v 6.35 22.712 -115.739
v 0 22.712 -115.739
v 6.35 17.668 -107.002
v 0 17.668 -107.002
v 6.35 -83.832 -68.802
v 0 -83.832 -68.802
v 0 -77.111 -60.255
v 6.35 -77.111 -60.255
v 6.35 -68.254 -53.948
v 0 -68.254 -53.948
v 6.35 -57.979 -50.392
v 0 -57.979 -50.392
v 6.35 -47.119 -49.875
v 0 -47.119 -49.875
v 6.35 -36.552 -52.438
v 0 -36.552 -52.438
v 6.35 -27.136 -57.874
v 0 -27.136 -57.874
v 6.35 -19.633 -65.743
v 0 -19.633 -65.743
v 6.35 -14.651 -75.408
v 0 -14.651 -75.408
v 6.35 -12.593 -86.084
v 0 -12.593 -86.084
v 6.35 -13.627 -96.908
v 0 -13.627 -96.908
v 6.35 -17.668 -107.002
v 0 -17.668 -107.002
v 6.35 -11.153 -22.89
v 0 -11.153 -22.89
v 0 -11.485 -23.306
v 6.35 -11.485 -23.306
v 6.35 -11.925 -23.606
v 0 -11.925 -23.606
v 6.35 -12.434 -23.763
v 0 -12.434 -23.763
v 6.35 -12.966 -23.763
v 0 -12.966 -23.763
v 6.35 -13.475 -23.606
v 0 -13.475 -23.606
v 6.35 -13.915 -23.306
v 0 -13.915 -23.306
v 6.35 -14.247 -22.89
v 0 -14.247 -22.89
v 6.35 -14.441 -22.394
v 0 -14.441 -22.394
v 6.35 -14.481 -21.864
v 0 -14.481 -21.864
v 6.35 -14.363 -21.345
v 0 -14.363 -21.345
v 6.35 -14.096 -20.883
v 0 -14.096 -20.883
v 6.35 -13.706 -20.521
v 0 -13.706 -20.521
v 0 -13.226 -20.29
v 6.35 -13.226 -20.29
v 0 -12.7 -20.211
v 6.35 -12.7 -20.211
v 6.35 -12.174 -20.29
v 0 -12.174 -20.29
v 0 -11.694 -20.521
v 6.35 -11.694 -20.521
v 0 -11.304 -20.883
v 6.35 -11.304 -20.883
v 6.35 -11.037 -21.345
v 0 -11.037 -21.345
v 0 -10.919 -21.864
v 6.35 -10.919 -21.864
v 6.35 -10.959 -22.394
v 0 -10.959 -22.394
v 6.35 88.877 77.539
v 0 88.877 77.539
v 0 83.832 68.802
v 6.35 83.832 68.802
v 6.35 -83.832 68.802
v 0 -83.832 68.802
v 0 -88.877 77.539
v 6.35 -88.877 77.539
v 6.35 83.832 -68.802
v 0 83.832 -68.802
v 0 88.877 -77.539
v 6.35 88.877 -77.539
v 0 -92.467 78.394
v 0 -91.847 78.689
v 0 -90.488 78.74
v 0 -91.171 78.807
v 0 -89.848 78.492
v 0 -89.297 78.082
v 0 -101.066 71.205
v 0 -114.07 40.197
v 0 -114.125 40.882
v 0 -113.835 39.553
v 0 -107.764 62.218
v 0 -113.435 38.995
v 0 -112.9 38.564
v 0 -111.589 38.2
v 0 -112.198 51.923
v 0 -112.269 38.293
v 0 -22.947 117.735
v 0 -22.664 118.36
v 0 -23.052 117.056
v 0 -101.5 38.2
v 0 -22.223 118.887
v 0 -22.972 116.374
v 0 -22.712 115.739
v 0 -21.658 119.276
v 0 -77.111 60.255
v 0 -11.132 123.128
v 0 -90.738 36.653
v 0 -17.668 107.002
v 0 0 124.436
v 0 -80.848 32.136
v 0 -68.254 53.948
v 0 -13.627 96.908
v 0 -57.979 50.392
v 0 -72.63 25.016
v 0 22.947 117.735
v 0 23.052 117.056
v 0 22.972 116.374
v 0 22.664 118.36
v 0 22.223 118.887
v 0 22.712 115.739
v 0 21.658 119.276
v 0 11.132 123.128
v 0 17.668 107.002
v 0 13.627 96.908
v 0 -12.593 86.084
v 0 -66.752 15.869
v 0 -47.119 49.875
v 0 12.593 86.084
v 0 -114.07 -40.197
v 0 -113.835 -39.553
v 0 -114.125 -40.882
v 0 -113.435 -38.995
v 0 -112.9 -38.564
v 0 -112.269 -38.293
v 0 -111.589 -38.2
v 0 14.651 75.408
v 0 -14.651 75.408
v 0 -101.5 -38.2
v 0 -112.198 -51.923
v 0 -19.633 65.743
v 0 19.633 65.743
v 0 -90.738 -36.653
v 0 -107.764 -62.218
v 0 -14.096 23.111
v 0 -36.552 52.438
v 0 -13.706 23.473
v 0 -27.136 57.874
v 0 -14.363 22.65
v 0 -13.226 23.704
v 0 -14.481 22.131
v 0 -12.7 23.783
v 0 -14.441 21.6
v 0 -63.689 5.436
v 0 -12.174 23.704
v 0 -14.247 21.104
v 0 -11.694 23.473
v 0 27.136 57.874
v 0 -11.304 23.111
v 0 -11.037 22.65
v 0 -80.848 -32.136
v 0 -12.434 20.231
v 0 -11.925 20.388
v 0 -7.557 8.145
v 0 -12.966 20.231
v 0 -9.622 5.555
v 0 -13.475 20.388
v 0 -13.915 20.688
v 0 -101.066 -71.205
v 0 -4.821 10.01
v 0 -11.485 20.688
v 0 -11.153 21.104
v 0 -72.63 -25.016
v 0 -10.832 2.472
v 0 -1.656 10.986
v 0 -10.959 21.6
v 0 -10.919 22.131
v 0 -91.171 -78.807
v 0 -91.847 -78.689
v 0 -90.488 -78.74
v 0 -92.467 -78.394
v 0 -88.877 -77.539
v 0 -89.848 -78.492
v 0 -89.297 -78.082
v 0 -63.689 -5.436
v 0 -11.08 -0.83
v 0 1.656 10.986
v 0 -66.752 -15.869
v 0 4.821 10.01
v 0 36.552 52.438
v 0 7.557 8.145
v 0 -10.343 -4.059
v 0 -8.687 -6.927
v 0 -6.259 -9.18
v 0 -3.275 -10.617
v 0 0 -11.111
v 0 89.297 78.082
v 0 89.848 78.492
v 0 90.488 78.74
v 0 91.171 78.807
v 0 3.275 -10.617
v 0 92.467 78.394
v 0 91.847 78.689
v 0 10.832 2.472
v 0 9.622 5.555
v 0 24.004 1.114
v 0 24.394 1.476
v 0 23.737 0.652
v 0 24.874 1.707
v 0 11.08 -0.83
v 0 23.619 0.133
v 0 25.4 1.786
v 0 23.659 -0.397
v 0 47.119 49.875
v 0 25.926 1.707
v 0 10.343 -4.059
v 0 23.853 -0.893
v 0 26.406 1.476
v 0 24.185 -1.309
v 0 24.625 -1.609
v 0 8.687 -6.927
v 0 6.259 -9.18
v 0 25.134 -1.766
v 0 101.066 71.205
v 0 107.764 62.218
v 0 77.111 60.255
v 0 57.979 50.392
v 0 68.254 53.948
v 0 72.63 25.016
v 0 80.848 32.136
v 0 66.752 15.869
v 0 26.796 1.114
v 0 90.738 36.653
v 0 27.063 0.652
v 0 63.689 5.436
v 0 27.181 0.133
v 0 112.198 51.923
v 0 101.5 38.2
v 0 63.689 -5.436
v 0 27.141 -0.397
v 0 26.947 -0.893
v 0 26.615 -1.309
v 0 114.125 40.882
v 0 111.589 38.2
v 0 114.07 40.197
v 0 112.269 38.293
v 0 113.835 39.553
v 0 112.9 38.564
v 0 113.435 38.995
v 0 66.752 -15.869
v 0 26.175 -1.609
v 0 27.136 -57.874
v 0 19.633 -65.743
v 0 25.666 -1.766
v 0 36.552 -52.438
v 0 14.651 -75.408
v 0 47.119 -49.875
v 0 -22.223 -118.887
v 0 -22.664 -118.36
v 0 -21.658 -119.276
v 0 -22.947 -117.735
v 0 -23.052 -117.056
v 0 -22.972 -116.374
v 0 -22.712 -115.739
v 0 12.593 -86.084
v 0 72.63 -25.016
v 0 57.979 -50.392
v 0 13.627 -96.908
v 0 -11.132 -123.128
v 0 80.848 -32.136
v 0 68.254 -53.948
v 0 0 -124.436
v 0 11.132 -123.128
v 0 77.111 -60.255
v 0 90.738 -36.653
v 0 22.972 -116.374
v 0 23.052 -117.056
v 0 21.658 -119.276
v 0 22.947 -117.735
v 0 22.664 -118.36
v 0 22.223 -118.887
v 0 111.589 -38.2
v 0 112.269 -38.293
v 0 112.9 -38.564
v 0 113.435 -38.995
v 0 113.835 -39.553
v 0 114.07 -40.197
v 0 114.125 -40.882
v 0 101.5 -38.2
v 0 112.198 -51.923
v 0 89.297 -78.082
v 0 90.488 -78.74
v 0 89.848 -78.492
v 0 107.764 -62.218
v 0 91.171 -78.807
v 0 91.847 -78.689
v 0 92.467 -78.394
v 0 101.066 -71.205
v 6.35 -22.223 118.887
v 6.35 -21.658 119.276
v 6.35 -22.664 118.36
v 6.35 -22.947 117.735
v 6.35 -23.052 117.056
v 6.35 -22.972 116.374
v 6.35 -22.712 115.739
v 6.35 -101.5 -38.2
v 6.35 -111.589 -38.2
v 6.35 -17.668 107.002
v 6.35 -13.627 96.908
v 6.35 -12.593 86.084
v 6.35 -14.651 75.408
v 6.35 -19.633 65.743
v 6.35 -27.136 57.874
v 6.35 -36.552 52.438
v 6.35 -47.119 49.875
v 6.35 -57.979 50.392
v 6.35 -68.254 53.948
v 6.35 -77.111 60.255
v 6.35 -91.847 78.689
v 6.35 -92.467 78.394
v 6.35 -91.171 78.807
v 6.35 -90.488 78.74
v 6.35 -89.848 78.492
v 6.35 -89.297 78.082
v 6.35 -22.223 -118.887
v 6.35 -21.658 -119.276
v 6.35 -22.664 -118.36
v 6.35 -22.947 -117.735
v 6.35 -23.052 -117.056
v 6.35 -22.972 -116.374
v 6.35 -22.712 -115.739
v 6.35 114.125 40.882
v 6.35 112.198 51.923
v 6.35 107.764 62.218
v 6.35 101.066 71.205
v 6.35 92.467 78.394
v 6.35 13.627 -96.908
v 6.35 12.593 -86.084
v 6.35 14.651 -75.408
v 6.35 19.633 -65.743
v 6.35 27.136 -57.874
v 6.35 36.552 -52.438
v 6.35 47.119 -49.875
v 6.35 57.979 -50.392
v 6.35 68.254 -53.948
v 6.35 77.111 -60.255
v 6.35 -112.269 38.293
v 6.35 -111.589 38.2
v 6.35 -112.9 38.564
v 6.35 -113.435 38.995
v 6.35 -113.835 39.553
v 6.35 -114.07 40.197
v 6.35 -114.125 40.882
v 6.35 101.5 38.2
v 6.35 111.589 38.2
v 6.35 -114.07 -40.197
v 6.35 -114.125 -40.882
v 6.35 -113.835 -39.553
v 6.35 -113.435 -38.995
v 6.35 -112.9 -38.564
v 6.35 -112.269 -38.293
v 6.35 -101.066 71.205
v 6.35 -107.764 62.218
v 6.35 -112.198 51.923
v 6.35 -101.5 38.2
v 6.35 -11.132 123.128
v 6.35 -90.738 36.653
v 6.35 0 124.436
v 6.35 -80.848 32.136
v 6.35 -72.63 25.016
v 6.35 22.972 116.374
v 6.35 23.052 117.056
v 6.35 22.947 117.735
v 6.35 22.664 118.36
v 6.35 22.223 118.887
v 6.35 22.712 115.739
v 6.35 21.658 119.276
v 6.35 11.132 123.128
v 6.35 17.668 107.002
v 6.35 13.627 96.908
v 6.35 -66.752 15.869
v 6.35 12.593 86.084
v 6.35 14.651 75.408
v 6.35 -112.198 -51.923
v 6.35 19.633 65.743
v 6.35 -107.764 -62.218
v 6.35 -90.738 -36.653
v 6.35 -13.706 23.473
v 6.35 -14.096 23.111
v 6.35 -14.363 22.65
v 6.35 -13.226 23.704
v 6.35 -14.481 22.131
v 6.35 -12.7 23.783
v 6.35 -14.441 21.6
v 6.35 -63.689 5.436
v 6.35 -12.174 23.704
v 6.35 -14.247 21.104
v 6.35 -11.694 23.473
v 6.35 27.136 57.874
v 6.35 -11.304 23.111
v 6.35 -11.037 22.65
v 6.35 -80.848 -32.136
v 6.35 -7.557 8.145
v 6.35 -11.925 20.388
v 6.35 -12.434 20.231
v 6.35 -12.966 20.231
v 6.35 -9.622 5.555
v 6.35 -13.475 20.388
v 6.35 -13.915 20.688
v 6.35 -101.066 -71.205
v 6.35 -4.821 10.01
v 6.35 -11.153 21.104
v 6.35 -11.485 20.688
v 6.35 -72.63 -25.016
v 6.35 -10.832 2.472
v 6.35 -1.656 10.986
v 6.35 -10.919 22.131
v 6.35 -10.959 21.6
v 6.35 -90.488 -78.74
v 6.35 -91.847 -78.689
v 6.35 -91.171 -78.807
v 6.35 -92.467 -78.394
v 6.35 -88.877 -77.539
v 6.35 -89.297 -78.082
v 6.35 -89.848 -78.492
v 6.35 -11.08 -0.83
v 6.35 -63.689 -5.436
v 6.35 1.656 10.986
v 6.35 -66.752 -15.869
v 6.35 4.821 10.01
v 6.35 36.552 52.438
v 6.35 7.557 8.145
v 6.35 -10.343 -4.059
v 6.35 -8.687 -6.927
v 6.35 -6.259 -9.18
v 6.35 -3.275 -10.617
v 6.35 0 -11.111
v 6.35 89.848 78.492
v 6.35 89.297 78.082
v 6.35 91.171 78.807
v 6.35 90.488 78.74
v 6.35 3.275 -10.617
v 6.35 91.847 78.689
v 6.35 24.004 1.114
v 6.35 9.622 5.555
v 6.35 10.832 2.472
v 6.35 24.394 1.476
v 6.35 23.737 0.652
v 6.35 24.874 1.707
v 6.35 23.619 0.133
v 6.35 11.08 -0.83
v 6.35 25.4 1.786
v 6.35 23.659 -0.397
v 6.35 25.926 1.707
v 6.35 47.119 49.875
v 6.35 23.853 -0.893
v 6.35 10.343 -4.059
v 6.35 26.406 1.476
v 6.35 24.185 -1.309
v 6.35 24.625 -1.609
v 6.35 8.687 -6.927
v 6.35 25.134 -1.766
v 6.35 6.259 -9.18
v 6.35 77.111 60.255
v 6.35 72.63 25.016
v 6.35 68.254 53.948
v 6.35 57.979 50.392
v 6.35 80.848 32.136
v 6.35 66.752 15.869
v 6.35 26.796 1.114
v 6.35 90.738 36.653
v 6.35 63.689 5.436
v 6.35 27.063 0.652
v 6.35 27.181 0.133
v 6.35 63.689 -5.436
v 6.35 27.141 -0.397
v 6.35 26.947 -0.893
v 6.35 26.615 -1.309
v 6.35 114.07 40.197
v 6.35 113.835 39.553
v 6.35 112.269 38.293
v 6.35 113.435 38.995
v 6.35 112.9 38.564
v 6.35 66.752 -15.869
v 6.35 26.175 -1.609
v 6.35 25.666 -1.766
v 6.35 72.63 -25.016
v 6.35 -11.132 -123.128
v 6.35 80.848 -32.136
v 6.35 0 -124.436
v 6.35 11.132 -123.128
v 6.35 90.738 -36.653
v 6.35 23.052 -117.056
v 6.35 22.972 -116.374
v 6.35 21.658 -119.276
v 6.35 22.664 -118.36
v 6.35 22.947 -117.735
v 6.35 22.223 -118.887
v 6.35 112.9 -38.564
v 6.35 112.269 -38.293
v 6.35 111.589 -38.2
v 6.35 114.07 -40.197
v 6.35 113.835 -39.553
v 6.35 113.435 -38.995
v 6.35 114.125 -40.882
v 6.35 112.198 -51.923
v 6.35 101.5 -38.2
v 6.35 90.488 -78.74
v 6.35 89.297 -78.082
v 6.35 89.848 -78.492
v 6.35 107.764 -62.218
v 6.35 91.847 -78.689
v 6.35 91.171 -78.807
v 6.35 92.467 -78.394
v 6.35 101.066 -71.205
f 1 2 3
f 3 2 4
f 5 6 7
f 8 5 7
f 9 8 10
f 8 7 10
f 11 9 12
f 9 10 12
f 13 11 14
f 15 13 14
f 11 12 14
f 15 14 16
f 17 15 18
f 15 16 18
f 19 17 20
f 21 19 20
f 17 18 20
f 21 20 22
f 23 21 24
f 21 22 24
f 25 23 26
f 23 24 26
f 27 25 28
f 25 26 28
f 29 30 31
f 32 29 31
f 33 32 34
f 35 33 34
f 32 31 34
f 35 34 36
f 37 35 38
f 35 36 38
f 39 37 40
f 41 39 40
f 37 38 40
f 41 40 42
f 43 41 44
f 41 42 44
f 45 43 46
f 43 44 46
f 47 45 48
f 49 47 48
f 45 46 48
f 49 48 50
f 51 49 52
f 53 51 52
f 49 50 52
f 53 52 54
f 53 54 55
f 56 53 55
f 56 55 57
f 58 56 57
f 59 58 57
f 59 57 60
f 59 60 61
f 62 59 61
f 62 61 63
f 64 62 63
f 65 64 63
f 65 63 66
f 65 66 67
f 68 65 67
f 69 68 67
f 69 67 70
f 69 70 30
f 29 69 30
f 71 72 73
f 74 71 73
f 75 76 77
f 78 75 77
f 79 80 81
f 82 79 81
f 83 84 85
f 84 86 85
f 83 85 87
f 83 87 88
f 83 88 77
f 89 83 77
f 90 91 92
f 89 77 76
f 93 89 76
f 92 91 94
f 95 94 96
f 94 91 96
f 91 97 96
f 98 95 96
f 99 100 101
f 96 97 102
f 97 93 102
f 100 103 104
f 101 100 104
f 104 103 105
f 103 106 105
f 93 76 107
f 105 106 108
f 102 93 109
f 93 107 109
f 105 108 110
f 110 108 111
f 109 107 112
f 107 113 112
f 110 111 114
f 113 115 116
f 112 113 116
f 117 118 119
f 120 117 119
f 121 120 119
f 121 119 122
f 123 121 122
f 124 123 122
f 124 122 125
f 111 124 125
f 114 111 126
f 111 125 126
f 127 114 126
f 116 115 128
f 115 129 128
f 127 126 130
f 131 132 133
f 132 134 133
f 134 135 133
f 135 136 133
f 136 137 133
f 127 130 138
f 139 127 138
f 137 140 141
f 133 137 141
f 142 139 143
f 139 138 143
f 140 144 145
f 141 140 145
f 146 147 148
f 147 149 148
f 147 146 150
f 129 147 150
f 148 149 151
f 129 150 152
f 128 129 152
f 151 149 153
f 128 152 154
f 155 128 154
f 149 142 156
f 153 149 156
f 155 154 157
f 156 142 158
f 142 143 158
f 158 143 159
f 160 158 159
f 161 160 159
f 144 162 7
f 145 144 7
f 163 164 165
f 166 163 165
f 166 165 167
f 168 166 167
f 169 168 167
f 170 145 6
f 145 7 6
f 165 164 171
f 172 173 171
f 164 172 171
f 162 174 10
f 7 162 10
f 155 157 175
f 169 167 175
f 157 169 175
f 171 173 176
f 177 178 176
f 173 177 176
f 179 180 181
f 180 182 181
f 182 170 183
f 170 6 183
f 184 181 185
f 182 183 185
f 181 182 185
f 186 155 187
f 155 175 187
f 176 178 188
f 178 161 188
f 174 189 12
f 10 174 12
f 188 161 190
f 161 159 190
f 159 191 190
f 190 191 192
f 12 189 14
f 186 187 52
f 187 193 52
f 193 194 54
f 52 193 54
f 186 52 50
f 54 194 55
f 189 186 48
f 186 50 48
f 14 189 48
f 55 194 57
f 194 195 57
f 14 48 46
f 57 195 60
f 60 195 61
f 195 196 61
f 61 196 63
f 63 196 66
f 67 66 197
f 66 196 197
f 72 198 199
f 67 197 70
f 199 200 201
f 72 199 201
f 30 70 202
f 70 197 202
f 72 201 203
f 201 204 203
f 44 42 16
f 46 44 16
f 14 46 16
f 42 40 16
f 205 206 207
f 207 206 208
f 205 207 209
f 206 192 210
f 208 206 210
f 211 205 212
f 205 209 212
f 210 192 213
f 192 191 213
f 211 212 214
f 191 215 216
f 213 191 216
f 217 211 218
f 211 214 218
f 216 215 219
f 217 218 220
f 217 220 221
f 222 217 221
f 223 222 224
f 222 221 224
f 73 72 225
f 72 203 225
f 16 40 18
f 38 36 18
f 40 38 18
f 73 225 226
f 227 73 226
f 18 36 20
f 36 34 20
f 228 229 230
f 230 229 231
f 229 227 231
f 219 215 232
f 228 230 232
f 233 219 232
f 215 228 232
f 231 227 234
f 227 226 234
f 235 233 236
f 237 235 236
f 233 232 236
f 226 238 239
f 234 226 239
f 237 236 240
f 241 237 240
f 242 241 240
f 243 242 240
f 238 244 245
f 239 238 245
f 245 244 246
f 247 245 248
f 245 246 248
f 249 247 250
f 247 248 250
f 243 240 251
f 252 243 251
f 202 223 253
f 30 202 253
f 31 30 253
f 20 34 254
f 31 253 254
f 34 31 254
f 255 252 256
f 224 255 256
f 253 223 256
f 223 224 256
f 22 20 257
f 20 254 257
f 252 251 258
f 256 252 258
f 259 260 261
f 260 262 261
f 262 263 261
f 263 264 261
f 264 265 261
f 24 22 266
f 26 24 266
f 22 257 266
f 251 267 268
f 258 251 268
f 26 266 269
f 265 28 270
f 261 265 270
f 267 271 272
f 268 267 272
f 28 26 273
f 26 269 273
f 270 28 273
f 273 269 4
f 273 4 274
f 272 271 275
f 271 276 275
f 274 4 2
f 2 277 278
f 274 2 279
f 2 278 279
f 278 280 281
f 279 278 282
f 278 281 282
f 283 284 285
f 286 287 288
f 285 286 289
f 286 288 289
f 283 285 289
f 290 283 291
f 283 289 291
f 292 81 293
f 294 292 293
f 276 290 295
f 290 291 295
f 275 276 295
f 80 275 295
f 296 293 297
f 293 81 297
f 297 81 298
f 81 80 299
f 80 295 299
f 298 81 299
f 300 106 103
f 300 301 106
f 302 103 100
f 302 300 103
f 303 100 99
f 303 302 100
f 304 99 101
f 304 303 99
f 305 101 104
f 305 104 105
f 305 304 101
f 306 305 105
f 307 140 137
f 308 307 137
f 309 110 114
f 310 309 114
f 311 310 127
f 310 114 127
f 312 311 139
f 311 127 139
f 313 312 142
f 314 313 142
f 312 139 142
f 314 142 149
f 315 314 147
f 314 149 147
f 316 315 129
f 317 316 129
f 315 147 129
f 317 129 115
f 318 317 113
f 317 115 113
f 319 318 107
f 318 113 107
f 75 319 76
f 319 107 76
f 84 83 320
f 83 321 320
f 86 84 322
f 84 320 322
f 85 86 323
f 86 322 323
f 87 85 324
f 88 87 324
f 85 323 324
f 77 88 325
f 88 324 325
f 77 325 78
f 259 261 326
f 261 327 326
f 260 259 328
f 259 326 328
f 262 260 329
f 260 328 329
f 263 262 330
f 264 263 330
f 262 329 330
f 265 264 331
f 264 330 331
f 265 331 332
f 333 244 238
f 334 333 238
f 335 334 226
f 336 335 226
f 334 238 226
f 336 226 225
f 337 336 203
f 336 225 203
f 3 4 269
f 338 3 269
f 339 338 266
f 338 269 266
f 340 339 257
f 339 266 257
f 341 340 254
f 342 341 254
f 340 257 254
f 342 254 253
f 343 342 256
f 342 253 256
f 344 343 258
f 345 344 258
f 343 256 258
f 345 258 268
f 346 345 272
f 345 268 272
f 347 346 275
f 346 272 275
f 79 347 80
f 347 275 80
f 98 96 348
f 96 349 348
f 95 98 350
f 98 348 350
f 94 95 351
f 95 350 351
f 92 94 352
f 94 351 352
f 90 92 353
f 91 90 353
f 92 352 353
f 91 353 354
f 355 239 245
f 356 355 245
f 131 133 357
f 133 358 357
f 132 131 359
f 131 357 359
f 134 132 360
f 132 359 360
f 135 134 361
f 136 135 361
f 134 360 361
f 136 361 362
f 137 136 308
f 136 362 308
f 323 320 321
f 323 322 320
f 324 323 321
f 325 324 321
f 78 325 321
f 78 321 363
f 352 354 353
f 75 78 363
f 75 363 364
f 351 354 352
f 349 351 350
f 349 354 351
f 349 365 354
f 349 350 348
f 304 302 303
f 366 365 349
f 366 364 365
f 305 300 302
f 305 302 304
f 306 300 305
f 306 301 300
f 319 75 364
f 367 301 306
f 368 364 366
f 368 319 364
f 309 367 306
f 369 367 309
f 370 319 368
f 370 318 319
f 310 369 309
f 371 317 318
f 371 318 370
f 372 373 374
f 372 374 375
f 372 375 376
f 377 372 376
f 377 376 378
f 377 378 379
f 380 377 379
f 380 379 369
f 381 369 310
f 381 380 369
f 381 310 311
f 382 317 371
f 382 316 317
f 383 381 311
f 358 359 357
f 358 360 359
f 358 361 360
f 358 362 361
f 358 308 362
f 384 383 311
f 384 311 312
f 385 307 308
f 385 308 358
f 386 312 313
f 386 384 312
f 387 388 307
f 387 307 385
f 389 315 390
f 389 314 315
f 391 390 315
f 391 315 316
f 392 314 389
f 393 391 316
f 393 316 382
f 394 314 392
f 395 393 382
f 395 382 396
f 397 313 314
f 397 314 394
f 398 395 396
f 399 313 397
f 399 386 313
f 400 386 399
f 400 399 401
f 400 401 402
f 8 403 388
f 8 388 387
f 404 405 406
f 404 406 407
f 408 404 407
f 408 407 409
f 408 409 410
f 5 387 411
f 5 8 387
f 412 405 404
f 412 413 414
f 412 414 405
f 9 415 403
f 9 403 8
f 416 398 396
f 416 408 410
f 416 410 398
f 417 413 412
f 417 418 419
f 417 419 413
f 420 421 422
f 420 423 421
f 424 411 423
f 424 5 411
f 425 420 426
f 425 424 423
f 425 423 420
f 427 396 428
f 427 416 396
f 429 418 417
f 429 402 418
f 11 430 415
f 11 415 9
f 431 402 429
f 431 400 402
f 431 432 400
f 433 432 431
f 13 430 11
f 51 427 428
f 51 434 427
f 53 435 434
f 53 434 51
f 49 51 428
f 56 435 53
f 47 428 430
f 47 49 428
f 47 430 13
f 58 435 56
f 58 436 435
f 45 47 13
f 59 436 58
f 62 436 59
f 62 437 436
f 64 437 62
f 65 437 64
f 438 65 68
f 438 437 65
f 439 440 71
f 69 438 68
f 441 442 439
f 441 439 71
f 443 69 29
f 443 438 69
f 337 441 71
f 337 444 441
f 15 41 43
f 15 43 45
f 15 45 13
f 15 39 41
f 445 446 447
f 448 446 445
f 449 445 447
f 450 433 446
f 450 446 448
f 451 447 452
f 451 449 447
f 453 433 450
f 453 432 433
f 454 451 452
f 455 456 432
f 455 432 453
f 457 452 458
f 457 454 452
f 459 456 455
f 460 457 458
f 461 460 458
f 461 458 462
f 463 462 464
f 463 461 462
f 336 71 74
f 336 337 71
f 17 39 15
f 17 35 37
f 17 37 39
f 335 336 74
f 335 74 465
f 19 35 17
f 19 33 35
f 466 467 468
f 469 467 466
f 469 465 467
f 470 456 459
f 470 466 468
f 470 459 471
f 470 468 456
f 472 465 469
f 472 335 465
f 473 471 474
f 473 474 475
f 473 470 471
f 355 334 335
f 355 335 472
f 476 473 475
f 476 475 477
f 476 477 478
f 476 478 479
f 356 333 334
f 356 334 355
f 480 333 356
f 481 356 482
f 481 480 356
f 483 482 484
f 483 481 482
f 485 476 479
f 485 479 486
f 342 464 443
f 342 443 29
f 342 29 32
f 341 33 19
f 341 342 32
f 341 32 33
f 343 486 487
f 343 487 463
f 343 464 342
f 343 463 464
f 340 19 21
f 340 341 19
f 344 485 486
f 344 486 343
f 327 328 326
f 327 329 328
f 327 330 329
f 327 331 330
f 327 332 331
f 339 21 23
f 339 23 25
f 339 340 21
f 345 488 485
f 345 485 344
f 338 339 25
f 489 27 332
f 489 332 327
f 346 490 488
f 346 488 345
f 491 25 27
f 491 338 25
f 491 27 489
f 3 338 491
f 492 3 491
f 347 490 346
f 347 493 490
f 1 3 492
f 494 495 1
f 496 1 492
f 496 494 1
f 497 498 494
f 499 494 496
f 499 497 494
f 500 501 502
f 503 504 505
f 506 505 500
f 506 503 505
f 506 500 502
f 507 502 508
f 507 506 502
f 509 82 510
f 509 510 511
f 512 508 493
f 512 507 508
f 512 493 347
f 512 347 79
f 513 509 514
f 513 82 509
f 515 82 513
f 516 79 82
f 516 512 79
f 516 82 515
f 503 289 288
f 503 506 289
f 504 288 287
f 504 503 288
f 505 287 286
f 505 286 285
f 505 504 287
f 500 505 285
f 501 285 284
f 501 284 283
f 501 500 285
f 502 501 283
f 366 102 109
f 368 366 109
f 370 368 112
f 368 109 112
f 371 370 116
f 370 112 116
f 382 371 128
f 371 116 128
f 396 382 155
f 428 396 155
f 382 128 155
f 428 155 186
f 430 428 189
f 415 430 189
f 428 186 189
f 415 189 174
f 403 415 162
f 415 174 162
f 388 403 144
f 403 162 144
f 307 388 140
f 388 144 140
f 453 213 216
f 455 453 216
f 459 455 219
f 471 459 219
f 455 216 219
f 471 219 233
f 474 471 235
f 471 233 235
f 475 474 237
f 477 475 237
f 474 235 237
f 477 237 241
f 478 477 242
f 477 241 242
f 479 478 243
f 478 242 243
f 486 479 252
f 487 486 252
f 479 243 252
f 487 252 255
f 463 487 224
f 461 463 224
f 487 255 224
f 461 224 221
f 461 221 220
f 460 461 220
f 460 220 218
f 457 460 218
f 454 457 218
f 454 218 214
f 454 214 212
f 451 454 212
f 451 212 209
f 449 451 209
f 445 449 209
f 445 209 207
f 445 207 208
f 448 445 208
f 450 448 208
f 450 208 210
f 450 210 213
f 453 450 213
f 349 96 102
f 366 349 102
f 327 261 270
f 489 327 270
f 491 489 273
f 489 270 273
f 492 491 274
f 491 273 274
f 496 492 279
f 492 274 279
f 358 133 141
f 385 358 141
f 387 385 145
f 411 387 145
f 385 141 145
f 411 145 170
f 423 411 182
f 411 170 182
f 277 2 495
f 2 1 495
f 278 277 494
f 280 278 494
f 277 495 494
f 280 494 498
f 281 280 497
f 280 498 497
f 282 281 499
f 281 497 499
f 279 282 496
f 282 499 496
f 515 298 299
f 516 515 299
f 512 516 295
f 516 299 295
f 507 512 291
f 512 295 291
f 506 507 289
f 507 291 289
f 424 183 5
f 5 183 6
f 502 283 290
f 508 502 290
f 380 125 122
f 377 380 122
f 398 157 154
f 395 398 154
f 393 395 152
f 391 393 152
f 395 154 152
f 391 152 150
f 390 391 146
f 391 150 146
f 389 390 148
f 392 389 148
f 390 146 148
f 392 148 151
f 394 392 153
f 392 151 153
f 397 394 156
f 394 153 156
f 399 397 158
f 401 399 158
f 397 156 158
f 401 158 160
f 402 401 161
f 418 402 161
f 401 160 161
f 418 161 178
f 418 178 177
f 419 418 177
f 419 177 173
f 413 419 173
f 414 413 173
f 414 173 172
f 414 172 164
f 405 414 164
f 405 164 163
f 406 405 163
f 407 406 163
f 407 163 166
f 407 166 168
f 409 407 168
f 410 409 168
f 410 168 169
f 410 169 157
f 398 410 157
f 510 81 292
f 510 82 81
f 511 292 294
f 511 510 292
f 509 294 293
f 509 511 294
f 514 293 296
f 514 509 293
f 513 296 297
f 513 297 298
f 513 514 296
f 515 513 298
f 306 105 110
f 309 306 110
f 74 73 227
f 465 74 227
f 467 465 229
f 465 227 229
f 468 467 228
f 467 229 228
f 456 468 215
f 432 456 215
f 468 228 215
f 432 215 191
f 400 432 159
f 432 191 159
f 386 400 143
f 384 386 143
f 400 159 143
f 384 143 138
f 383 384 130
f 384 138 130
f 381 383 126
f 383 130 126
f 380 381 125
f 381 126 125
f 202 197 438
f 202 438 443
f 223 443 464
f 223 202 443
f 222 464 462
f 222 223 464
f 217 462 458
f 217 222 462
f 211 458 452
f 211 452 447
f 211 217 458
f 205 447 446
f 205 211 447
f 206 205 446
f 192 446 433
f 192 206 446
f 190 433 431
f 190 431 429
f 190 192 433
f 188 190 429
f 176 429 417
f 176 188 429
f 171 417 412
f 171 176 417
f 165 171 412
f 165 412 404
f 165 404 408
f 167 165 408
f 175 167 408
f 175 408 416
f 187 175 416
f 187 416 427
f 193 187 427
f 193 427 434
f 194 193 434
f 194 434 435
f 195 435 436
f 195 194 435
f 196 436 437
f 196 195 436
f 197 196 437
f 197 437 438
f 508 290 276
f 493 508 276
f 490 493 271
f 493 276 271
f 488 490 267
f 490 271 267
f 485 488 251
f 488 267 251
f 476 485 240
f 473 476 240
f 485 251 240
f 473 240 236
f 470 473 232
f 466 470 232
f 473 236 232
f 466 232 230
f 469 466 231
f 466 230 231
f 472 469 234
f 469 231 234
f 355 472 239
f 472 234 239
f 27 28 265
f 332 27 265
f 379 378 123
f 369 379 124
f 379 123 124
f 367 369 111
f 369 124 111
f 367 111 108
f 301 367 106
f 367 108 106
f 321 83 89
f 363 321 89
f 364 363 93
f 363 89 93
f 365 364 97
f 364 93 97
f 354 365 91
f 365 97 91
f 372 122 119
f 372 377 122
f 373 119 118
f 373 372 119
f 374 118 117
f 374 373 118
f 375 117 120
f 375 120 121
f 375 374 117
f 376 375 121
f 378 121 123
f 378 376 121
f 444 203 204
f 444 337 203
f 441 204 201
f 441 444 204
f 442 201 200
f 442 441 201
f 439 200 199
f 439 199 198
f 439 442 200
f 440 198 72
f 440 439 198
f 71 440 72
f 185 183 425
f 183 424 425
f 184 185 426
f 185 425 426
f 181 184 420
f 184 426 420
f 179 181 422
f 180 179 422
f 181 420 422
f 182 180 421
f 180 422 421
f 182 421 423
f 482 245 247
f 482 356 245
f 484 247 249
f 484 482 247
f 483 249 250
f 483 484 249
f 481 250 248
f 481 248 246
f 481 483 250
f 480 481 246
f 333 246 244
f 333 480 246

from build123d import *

# Parameters (mm, degrees)
SKETCH1_R                       = 11.110595
BOSS_EXTRUDE1_DEPTH             = 6.35
F_9_64_0_14063_DIAMETER_HOLE1_D = 3.572002
CIRPATTERN1_COUNT               = 3
FILLET1_R                       = 2.54


with BuildPart() as part:
    # Sketch1 → Boss-Extrude1 (new body)
    with BuildSketch(Plane(origin=(0, 0, 0), x_dir=(0, 0, -1), z_dir=(1, 0, 0))):
        with BuildLine():
            Line((68.801578457, 83.832170471), (79.800101085, 90.182170471))
            ThreePointArc((79.800101085, 90.182170471), (62.217829583, 107.764441974), (38.200000054, 114.2))
            Line((38.200000054, 114.2), (38.200000054, 101.5))
            ThreePointArc((38.200000054, 101.5), (0, 63.299999946), (-38.200000054, 101.5))
            Line((-38.200000054, 101.5), (-38.200000054, 114.2))
            ThreePointArc((-38.200000054, 114.2), (-62.217829583, 107.764441974), (-79.800101085, 90.182170471))
            Line((-79.800101085, 90.182170471), (-68.801578457, 83.832170471))
            ThreePointArc((-68.801578457, 83.832170471), (-54.819408013, 31.649999973), (-107.001578511, 17.667829529))
            Line((-107.001578511, 17.667829529), (-118.000101139, 24.017829529))
            ThreePointArc((-118.000101139, 24.017829529), (-124.435659165, 0), (-118.000101139, -24.017829529))
            Line((-118.000101139, -24.017829529), (-107.001578511, -17.667829529))
            ThreePointArc((-107.001578511, -17.667829529), (-54.819408013, -31.649999973), (-68.801578457, -83.832170471))
            Line((-68.801578457, -83.832170471), (-79.800101085, -90.182170471))
            ThreePointArc((-79.800101085, -90.182170471), (-62.217829583, -107.764441974), (-38.200000054, -114.2))
            Line((-38.200000054, -114.2), (-38.200000054, -101.5))
            ThreePointArc((-38.200000054, -101.5), (0, -63.299999946), (38.200000054, -101.5))
            Line((38.200000054, -101.5), (38.200000054, -114.2))
            ThreePointArc((38.200000054, -114.2), (62.217829583, -107.764441974), (79.800101085, -90.182170471))
            Line((79.800101085, -90.182170471), (68.801578457, -83.832170471))
            ThreePointArc((68.801578457, -83.832170471), (54.819408013, -31.649999973), (107.001578511, -17.667829529))
            Line((107.001578511, -17.667829529), (118.000101139, -24.017829529))
            ThreePointArc((118.000101139, -24.017829529), (124.435659165, 0), (118.000101139, 24.017829529))
            Line((118.000101139, 24.017829529), (107.001578511, 17.667829529))
            ThreePointArc((107.001578511, 17.667829529), (54.819408013, 31.649999973), (68.801578457, 83.832170471))
        make_face()
        Circle(SKETCH1_R, mode=Mode.SUBTRACT)
    extrude(amount=BOSS_EXTRUDE1_DEPTH)

    # 9/64 (0.14063) Diameter Hole1 (through all)
    with Locations(Plane(origin=(6.35, 0, 0), x_dir=(0, 0, -1), z_dir=(1, 0, 0))):
        with Locations((0, 25.4)):
            f_9_64_0_14063_diameter_hole1 = Hole(F_9_64_0_14063_DIAMETER_HOLE1_D / 2)

    # CirPattern1: 9/64 (0.14063) Diameter Hole1 ×3 about axis
    cirpattern1_axis = Axis((0, 0, 0), (1, 0, 0))
    for i in range(1, CIRPATTERN1_COUNT):
        add(f_9_64_0_14063_diameter_hole1.rotate(cirpattern1_axis, i * 360 / CIRPATTERN1_COUNT), mode=Mode.SUBTRACT)

    # Fillet1
    fillet1_edges = [part.edges().sort_by_distance(p)[0] for p in [
        (3.175, 114.2, -38.200000054),
        (3.175, 90.182170471, -79.800101085),
        (3.175, 24.017829529, -118.000101139),
        (3.175, -24.017829529, -118.000101139),
        (3.175, -90.182170471, -79.800101085),
        (3.175, -114.2, -38.200000054),
        (3.175, -114.2, 38.200000054),
        (3.175, -90.182170471, 79.800101085),
        (3.175, -24.017829529, 118.000101139),
        (3.175, 24.017829529, 118.000101139),
        (3.175, 90.182170471, 79.800101085),
        (3.175, 114.2, 38.200000054),
    ]]
    fillet(fillet1_edges, radius=FILLET1_R)


solid = part.part
